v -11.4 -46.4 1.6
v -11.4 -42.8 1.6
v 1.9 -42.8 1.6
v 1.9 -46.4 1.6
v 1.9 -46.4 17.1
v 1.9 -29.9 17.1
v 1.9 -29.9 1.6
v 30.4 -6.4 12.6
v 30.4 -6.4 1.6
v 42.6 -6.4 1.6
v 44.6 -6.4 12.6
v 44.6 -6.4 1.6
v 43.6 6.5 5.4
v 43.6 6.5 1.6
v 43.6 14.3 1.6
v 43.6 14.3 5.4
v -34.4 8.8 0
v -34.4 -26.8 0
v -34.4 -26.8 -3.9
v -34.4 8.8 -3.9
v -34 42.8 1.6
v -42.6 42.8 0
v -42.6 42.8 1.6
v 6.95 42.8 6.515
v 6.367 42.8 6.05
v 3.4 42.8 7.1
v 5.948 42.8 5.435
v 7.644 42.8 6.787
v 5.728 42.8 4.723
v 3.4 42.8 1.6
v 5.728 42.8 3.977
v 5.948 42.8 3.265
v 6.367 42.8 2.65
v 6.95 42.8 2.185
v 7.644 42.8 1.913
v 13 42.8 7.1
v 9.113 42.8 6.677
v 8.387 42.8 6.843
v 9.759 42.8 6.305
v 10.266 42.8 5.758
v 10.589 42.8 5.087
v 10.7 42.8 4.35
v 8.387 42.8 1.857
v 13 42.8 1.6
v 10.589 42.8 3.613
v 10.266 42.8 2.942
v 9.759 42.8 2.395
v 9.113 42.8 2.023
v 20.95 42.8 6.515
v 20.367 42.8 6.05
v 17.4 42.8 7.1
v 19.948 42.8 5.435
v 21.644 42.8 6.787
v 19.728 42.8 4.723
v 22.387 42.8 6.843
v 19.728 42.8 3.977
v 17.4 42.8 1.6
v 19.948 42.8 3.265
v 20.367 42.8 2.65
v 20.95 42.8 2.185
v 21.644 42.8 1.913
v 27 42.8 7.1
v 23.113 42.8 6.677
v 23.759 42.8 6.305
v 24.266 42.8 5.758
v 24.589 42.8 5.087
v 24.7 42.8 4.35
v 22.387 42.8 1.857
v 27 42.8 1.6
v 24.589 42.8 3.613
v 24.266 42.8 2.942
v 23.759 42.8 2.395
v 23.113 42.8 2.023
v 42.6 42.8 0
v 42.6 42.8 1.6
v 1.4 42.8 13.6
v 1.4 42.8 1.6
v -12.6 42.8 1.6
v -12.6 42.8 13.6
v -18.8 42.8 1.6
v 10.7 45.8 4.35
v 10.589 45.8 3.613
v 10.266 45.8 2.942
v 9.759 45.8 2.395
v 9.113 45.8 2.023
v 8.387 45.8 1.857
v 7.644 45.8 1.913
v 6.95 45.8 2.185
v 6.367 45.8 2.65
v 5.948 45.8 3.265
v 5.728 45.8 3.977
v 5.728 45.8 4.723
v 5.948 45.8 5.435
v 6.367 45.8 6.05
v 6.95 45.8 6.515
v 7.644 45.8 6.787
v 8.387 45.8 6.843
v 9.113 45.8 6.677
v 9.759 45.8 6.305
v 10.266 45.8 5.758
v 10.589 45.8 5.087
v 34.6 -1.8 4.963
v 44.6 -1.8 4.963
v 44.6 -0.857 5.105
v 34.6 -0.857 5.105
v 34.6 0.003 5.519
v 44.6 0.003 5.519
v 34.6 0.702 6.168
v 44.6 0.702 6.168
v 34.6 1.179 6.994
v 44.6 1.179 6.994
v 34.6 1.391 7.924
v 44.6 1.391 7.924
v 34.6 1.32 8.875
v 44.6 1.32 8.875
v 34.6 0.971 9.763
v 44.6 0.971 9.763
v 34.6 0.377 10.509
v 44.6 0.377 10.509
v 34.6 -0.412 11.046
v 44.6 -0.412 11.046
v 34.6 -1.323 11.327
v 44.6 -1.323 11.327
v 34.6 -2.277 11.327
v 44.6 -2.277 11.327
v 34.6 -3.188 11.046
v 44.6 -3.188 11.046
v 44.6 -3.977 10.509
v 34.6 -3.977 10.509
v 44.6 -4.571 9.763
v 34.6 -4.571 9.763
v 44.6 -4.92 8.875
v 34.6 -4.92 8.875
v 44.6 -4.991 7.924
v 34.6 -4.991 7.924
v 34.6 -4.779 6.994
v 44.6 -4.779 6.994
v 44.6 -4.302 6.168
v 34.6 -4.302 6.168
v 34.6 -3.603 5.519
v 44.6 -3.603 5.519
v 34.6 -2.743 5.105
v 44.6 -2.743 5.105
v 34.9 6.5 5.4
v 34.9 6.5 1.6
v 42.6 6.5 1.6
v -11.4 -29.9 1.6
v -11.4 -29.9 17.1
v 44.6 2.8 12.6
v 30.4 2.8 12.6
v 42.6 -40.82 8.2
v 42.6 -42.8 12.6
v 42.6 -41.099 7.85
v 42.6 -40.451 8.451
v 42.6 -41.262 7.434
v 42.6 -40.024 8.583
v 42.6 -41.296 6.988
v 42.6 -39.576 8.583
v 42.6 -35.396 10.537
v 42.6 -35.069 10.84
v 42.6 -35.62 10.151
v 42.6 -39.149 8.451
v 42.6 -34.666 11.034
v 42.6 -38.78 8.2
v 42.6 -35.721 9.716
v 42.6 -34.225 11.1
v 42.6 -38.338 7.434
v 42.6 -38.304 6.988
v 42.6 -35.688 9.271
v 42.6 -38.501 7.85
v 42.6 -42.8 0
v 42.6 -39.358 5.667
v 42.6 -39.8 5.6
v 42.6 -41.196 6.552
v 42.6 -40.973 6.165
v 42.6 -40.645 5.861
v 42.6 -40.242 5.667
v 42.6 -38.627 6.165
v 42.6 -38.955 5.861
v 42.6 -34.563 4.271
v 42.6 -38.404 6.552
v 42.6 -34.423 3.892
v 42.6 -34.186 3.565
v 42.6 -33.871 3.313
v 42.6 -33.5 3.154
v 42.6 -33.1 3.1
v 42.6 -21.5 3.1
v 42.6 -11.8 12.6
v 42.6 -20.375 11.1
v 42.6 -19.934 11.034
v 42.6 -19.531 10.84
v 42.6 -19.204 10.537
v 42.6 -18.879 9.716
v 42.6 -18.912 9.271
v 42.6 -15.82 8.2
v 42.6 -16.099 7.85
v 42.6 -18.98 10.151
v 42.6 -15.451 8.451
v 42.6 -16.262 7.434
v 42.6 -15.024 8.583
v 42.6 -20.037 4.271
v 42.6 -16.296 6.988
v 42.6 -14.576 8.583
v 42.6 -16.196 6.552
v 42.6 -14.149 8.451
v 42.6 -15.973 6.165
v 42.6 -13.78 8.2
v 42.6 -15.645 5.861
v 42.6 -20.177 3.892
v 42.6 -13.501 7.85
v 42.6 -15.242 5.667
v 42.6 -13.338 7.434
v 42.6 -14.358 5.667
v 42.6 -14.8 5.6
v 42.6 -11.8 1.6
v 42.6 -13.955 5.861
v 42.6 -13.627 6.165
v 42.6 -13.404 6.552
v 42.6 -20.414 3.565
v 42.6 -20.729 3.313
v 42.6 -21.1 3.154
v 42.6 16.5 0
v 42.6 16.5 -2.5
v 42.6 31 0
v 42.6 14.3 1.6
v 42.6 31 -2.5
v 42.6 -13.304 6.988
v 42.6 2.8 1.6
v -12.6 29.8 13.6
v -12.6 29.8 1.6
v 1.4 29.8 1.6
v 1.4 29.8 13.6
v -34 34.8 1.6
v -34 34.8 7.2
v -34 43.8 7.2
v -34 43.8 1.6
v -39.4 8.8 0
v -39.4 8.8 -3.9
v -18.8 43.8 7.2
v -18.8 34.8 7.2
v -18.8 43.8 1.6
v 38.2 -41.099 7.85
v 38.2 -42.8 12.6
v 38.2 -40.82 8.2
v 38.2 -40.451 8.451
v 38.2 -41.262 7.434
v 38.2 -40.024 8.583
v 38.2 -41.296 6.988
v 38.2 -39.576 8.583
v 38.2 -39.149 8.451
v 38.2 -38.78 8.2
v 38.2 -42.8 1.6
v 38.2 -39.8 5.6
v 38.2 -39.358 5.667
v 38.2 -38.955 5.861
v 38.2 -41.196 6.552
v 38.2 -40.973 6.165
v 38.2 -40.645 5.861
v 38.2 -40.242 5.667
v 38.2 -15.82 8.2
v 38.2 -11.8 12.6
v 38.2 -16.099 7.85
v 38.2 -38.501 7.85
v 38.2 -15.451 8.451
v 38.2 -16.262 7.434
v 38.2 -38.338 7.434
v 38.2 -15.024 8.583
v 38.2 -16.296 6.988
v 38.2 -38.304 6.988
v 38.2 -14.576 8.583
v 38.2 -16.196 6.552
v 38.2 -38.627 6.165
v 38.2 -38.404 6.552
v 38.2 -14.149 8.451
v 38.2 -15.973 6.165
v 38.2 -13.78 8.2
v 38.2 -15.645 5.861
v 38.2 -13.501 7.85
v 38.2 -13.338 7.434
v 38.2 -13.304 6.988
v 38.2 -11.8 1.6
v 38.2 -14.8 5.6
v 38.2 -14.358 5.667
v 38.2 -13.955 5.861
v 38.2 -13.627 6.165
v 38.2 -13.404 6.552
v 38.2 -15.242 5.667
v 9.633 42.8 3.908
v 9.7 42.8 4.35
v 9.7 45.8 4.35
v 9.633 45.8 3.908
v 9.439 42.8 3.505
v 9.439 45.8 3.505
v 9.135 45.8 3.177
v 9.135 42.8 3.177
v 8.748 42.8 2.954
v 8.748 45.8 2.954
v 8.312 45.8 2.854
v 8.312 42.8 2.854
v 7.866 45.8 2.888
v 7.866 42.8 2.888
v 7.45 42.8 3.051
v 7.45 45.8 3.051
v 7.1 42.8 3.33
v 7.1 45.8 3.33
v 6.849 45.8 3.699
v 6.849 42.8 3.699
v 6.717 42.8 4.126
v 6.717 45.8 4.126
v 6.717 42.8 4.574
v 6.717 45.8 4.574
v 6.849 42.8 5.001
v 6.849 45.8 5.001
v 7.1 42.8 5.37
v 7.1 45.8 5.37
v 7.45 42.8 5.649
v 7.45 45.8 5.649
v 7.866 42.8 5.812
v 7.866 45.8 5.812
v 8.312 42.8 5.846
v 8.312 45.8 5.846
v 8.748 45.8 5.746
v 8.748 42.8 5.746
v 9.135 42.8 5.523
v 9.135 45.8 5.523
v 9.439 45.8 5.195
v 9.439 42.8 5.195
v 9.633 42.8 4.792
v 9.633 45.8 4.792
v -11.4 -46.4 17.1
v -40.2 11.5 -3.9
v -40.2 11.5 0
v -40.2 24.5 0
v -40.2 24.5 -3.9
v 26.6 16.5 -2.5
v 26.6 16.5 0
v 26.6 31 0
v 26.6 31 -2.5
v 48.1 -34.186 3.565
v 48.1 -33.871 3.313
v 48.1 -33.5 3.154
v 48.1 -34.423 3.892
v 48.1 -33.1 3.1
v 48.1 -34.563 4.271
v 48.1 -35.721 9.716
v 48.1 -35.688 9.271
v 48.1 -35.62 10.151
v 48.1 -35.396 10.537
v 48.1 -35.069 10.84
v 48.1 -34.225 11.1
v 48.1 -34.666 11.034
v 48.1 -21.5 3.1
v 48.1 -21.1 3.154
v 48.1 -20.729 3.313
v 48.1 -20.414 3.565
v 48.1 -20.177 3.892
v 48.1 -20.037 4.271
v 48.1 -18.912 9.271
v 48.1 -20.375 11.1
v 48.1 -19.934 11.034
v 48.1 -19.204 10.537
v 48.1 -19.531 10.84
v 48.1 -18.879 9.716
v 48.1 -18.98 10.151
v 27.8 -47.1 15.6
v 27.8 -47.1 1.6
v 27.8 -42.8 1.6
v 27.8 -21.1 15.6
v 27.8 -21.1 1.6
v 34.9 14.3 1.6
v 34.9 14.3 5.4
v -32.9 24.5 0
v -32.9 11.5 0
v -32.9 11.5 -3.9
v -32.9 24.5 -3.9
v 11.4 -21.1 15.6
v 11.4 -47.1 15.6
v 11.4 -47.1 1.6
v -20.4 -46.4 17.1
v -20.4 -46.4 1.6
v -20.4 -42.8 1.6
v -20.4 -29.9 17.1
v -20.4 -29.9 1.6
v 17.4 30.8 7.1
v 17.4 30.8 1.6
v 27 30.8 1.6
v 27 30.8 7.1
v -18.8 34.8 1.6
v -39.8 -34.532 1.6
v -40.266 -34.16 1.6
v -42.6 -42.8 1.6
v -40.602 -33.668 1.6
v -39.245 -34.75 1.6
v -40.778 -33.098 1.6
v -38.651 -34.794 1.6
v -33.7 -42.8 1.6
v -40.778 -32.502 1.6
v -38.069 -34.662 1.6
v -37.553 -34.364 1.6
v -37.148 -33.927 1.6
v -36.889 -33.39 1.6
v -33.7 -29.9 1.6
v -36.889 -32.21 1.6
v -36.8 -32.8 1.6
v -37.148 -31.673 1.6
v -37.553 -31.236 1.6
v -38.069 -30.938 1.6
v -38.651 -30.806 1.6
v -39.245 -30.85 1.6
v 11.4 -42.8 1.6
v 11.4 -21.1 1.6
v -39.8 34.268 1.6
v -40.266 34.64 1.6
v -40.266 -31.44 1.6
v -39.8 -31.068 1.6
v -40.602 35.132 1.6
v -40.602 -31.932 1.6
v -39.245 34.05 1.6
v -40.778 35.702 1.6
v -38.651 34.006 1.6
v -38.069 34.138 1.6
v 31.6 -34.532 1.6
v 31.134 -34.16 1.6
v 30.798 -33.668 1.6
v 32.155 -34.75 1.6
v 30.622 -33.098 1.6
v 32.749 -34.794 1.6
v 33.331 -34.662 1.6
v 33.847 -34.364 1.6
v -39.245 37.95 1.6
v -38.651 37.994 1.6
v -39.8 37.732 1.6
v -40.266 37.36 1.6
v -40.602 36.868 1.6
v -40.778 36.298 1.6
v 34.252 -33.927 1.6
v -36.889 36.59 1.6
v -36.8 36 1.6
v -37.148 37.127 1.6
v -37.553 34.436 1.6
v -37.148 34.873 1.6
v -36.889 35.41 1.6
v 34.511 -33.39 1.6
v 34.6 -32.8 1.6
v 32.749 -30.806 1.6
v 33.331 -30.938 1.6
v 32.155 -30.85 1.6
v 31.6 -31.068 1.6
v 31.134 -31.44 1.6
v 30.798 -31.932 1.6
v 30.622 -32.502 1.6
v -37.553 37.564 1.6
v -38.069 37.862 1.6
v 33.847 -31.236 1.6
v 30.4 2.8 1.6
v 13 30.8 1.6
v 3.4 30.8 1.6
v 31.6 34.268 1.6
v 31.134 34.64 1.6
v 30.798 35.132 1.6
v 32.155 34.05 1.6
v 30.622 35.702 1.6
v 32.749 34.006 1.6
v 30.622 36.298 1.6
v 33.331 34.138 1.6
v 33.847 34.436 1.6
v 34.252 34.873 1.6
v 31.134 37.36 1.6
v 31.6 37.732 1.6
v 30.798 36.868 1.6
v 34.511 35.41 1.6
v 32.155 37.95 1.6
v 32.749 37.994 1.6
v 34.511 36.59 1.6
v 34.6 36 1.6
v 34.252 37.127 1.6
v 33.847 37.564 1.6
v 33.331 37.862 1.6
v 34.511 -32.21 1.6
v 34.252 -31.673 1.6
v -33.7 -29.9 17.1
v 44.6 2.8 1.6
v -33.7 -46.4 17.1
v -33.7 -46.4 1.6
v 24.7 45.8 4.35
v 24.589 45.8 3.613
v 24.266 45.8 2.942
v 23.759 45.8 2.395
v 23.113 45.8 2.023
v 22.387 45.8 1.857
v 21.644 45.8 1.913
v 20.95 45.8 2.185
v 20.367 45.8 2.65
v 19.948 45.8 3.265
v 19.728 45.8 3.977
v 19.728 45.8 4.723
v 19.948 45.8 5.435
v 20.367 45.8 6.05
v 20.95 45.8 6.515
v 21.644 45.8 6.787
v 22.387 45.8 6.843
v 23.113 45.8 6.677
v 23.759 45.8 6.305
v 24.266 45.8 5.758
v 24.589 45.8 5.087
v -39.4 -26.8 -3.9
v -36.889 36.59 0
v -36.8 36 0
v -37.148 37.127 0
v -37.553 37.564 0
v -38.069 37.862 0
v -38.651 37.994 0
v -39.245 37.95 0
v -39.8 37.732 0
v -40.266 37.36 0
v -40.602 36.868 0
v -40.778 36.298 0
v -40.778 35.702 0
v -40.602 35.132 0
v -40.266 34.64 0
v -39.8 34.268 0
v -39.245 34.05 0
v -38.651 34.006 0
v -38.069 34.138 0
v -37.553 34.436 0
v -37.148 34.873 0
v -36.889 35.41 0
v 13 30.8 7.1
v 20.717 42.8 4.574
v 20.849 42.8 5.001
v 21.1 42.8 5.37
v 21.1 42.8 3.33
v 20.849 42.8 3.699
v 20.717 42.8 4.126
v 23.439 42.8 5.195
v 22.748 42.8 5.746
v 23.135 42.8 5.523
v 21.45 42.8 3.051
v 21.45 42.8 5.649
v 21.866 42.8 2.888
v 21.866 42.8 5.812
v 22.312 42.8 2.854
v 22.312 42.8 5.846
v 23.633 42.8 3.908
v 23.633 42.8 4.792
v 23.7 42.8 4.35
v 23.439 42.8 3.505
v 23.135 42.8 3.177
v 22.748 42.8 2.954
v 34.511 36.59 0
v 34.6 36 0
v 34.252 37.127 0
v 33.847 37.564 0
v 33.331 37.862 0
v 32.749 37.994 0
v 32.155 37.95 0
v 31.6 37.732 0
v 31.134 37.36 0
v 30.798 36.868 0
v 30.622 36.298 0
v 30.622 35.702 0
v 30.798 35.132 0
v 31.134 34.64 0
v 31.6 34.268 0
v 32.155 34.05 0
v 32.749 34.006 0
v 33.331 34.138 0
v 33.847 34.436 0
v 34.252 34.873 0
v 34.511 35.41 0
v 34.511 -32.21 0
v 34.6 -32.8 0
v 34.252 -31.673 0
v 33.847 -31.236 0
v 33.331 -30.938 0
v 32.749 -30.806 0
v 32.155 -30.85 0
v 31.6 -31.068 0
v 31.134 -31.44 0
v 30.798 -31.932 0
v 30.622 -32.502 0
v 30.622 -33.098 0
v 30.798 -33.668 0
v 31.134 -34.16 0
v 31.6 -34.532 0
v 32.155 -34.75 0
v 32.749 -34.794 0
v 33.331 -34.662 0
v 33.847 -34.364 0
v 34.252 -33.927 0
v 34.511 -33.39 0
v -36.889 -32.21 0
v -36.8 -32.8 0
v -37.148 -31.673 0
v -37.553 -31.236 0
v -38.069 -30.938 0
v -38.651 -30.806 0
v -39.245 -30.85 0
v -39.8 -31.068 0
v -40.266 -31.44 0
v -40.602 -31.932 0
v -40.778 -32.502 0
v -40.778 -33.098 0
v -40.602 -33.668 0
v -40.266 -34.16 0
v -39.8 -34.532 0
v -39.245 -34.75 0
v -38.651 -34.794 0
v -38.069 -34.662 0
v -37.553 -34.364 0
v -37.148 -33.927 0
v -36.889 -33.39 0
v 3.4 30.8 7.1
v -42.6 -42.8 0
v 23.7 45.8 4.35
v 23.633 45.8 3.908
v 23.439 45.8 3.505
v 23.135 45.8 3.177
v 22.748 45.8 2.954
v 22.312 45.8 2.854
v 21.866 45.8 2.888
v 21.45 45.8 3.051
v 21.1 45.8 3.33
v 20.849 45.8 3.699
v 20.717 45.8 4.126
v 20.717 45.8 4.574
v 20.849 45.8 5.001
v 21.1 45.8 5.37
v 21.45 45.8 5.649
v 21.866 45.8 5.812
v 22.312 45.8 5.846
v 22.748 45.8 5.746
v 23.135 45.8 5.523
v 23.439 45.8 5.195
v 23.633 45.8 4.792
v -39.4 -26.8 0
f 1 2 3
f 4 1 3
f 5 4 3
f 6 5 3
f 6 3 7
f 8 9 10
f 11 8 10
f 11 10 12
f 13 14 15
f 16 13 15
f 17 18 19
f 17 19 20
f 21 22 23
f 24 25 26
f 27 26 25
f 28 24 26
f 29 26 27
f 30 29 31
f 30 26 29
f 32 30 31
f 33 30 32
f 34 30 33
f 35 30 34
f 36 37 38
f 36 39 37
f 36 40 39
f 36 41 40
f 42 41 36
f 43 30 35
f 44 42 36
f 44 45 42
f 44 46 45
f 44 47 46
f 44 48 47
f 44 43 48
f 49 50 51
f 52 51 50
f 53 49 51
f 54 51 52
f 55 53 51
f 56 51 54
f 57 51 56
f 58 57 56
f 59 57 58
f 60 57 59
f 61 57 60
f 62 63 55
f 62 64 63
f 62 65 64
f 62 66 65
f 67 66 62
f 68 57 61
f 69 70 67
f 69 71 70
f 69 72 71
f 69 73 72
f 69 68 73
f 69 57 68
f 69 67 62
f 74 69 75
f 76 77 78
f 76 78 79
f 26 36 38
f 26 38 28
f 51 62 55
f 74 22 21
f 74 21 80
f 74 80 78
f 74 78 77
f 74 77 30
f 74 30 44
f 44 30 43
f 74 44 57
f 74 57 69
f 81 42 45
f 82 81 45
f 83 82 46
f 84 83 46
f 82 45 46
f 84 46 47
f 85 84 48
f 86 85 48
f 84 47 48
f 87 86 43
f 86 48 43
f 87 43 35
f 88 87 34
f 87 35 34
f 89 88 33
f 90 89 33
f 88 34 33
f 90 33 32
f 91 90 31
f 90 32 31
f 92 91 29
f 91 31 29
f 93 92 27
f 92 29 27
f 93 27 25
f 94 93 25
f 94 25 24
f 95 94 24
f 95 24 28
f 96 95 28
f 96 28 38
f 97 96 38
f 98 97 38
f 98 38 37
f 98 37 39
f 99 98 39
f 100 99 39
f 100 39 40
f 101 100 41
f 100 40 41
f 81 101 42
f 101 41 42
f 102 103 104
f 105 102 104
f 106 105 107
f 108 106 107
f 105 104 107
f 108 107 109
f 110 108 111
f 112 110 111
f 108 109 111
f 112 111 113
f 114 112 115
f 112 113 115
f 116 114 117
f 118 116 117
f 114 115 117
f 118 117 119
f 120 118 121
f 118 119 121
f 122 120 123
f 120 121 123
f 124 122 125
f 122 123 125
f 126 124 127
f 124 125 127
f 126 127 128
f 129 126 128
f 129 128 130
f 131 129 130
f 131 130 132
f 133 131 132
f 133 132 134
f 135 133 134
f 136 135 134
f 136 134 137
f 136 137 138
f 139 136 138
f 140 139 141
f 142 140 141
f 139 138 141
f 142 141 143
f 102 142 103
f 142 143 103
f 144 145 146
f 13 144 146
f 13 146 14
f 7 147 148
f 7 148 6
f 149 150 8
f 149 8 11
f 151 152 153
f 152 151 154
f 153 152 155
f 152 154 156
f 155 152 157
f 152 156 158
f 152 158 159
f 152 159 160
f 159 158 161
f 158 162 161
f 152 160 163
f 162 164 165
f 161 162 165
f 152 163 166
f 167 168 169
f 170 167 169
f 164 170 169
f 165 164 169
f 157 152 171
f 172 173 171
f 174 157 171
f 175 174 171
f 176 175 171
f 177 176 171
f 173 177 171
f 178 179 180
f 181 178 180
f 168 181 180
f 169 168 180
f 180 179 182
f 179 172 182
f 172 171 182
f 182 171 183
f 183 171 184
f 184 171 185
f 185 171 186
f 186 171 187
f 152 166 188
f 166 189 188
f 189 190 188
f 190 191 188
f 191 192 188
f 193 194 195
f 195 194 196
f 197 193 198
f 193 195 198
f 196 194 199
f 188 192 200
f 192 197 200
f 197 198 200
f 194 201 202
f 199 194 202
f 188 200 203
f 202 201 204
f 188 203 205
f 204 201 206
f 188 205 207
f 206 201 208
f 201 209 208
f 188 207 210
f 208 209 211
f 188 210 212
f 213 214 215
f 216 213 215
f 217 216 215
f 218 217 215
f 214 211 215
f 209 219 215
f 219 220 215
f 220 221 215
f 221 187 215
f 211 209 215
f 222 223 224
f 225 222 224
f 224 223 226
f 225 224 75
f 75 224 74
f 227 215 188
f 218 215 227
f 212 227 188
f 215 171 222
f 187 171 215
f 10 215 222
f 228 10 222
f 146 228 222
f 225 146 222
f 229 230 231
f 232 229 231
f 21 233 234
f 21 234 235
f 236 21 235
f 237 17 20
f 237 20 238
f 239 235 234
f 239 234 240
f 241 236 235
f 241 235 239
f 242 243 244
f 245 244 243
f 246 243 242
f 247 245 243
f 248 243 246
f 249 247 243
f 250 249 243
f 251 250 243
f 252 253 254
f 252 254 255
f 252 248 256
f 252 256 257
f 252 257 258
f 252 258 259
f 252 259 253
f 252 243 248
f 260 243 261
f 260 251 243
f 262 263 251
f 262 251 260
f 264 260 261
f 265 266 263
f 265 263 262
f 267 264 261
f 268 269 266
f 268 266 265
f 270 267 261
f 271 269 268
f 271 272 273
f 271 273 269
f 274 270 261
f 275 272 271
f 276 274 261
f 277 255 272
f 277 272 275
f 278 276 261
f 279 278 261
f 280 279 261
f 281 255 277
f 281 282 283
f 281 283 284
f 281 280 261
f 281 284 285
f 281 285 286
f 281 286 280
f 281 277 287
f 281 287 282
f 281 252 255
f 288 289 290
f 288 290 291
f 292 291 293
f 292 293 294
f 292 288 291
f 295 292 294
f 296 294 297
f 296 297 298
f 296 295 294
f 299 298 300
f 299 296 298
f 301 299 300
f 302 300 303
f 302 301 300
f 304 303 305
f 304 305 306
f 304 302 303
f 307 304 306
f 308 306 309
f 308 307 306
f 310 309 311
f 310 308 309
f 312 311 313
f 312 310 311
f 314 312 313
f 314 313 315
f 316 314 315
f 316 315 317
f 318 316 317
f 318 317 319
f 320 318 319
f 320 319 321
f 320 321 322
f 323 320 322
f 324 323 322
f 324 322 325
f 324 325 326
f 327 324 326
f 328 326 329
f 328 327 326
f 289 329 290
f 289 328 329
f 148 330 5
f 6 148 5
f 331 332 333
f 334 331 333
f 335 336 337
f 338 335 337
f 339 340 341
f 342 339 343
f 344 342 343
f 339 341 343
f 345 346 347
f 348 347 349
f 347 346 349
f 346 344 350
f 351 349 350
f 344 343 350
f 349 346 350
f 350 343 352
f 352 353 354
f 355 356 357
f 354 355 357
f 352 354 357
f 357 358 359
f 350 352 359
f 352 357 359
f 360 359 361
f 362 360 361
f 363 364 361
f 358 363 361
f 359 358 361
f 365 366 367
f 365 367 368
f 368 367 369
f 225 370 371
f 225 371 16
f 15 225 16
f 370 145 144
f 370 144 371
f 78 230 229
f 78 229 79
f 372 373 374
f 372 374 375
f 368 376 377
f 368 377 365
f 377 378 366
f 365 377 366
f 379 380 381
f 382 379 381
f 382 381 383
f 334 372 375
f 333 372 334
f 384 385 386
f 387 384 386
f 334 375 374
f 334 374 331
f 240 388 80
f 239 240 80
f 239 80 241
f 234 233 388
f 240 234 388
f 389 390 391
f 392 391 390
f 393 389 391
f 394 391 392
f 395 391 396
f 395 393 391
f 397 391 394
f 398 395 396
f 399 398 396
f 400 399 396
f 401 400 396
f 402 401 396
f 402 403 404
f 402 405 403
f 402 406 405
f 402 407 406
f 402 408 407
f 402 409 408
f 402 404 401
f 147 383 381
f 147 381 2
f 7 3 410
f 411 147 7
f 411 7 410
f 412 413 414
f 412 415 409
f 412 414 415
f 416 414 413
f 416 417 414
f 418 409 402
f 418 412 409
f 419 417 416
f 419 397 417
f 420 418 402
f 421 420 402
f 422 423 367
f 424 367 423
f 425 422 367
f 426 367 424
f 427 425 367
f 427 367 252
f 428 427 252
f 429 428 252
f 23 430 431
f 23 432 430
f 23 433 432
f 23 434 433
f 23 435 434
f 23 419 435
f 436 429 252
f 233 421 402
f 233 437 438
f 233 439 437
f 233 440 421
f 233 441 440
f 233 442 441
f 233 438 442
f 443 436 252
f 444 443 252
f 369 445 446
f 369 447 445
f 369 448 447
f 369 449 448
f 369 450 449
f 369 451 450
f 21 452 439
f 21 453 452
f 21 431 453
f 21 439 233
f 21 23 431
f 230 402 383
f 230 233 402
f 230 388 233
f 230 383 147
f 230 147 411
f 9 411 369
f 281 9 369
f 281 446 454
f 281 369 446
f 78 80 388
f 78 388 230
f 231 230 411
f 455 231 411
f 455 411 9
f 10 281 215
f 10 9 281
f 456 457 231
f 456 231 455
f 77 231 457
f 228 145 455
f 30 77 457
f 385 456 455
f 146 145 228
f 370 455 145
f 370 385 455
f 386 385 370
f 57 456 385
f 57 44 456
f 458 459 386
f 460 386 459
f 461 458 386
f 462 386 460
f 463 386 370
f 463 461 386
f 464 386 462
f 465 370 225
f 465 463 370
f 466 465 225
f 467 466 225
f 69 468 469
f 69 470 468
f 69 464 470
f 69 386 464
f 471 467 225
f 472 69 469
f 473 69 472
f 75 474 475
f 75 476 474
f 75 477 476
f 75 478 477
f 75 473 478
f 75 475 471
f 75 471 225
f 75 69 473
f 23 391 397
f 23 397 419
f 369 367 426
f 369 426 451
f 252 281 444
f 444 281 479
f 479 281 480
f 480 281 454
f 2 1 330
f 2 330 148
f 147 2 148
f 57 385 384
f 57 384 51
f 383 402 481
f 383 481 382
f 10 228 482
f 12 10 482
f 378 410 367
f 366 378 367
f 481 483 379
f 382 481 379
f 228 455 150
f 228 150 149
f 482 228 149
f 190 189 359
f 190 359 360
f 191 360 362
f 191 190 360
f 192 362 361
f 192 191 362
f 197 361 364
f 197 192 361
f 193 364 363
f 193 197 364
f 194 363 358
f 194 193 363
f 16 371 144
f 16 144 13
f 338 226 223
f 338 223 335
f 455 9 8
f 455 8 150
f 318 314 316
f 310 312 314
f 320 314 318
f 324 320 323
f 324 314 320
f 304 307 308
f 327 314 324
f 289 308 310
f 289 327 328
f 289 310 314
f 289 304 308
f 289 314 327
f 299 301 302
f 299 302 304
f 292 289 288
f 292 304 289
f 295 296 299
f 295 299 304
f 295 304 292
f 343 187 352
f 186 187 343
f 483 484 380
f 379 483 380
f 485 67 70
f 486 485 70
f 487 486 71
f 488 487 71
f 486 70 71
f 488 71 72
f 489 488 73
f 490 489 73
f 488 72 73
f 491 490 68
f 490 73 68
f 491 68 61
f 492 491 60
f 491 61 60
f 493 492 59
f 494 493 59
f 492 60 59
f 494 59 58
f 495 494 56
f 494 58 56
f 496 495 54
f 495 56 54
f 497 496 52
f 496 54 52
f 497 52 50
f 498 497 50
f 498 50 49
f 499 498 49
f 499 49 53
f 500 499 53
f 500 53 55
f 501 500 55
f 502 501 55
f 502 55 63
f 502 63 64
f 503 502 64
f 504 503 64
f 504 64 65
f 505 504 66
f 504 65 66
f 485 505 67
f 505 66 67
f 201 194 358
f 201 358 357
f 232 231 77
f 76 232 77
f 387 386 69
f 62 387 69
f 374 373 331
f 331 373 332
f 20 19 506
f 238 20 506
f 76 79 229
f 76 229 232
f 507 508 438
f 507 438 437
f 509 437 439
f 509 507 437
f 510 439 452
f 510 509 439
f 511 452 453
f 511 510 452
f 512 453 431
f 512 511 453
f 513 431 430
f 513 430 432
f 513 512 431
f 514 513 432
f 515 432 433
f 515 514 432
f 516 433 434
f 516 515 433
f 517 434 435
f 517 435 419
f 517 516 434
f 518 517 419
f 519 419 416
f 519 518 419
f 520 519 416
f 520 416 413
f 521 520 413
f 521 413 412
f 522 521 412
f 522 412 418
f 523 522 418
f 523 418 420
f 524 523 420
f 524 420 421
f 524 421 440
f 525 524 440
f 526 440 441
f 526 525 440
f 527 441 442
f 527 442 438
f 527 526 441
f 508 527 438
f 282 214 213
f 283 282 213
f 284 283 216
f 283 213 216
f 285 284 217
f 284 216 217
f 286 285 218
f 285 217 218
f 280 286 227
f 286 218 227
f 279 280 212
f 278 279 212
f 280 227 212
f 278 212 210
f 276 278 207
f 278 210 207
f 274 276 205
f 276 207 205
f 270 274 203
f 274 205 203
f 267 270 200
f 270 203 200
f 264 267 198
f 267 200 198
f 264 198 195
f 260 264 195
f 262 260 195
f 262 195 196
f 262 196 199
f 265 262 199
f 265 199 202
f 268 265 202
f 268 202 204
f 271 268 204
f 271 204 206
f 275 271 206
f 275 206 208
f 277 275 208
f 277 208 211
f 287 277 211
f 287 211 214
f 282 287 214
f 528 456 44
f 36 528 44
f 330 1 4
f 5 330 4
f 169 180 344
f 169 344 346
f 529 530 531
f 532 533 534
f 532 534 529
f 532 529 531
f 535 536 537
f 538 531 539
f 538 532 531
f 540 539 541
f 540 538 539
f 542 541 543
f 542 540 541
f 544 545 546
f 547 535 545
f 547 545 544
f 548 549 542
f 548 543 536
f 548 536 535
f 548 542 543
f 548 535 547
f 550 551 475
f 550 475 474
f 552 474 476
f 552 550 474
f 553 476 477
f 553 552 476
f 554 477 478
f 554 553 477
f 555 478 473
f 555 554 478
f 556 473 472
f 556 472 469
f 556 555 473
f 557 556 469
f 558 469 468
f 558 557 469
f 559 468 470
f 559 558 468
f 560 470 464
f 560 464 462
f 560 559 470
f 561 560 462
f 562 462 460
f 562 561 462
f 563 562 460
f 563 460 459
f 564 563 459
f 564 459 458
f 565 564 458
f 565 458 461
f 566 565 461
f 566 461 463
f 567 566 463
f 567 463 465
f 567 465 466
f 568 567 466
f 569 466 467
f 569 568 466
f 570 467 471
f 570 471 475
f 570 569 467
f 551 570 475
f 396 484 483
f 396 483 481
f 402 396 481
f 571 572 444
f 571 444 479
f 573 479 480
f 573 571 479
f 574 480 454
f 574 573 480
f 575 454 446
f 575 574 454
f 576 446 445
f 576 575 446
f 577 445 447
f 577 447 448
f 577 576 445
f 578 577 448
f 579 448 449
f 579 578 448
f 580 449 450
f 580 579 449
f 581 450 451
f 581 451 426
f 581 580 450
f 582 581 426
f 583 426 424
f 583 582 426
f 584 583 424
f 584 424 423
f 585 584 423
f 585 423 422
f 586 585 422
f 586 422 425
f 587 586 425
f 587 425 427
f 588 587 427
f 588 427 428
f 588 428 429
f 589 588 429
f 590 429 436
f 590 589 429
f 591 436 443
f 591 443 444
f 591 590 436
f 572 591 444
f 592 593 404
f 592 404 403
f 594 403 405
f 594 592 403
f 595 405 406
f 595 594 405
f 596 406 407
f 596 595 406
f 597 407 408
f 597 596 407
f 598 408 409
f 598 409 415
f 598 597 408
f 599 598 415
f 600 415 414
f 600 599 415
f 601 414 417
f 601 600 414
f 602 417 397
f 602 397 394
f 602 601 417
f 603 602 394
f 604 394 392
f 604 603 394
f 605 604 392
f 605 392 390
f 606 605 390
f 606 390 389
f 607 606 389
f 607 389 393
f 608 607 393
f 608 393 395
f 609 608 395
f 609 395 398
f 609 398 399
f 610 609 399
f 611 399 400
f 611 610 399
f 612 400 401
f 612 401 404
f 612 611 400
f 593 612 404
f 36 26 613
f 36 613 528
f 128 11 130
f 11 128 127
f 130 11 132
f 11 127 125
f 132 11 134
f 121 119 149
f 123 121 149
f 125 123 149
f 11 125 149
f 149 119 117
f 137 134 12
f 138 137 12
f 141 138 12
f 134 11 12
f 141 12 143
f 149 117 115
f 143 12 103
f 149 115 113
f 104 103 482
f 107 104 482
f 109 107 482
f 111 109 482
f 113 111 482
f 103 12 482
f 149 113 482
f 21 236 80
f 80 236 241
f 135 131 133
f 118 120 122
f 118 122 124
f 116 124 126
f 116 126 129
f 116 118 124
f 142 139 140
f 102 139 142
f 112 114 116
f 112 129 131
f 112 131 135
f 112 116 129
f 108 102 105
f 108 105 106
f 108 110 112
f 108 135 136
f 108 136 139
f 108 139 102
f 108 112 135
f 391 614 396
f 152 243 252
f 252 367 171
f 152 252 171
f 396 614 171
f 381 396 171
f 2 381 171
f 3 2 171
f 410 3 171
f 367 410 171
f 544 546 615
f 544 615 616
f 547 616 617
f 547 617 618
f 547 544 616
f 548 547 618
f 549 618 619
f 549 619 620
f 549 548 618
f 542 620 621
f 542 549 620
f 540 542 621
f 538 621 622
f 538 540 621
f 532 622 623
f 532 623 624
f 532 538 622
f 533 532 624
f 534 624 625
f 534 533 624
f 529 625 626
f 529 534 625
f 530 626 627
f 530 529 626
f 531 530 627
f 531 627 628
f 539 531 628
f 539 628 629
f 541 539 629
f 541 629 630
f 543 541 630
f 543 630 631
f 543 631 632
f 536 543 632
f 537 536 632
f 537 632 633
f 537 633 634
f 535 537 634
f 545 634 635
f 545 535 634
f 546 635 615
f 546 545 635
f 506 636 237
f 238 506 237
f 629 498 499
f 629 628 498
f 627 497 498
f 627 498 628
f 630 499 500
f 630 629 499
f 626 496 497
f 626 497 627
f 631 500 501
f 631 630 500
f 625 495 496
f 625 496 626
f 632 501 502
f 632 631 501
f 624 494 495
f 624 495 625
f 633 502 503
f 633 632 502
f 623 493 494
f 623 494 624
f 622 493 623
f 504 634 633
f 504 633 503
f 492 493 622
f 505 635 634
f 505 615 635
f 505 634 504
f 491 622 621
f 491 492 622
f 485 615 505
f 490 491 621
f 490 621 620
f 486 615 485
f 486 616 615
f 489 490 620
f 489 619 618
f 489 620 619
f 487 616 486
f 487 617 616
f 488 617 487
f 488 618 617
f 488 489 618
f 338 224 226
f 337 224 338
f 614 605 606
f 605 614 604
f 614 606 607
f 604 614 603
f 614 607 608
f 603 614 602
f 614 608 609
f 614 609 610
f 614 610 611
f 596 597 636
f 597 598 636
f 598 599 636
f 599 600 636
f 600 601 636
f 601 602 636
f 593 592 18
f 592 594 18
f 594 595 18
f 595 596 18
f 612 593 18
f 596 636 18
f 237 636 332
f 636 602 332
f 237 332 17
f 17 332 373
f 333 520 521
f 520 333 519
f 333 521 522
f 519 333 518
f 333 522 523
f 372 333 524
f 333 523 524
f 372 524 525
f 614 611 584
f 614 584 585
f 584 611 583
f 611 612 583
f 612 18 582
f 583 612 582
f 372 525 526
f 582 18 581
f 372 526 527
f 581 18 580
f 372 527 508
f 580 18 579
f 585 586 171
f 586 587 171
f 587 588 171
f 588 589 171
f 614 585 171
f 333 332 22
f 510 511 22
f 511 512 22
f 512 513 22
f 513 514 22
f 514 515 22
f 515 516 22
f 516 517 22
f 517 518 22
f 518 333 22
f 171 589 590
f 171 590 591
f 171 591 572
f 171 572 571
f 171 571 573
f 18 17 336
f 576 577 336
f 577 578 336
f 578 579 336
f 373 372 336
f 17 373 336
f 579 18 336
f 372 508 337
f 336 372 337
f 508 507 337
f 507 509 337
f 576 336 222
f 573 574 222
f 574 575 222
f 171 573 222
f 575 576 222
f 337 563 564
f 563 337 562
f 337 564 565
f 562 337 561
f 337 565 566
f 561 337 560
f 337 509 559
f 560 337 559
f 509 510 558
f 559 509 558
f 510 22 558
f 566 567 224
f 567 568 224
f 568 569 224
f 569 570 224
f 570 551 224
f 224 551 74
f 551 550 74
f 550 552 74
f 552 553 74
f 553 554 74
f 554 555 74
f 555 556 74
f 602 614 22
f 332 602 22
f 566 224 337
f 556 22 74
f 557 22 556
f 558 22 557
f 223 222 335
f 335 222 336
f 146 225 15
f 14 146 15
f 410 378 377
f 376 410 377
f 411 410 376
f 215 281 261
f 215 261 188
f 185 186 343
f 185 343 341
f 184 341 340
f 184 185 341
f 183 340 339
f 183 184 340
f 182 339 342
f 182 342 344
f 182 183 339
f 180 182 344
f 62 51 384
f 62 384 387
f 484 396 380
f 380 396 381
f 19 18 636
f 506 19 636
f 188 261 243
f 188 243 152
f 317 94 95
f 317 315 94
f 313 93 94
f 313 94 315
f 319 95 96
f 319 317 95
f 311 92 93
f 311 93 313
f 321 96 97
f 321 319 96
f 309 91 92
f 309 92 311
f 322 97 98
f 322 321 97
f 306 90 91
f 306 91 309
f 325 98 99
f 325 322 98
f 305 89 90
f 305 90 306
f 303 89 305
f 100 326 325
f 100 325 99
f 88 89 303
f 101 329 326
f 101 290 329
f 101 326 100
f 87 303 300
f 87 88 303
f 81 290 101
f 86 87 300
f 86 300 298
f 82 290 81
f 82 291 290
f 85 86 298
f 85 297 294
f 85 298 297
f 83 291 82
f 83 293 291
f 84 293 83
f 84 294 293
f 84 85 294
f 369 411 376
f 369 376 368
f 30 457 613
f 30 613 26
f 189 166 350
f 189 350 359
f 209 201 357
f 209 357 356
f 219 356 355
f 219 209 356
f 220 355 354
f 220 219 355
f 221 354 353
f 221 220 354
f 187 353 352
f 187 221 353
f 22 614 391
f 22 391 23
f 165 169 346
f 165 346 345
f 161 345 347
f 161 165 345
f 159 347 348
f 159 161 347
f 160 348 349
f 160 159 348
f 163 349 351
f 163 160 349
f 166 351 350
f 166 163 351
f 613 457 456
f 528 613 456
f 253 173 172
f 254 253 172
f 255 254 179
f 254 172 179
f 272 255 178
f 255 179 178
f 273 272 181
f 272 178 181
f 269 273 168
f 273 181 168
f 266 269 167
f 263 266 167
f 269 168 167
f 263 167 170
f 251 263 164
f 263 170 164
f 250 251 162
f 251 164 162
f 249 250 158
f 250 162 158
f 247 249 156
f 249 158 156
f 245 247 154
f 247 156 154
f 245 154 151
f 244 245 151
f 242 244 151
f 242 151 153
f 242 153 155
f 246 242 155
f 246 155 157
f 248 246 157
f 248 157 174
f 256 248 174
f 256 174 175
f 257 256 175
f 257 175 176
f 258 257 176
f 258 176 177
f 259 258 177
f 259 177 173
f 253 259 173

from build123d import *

# Parameters (mm, degrees)
SCHIZZO1_W                    = 85.2
SCHIZZO1_H                    = 85.6
SCHIZZO1_R                    = 2
ESTRUSIONE_ESTRUSIONE1_DEPTH  = 1.6
SCHIZZO3_W                    = 15.2
SCHIZZO3_H                    = 9
ESTRUSIONE_ESTRUSIONE2_DEPTH  = 5.6
SCHIZZO4_W                    = 14
SCHIZZO4_H                    = 13
ESTRUSIONE_ESTRUSIONE3_DEPTH  = 12
SCHIZZO5_W                    = 9.6
SCHIZZO5_H                    = 12
ESTRUSIONE_ESTRUSIONE4_DEPTH  = 5.5
SCHIZZO6_R                    = 2.5
SCHIZZO6_R_2                  = 1.5
ESTRUSIONE_SOTTILE1_DEPTH     = 3
SCHIZZO7_W                    = 16
SCHIZZO7_H                    = 14.5
ESTRUSIONE_ESTRUSIONE5_DEPTH  = 2.5
SCHIZZO8_W                    = 8.7
SCHIZZO8_H                    = 7.8
ESTRUSIONE_ESTRUSIONE6_DEPTH  = 3.8
SCHIZZO9_W                    = 14.2
SCHIZZO9_H                    = 9.2
ESTRUSIONE_ESTRUSIONE7_DEPTH  = 11
SCHIZZO10_R                   = 3.2
TAGLIO_ESTRUSIONE1_DEPTH      = 10
SCHIZZO11_W                   = 4.4
SCHIZZO11_H                   = 31
ESTRUSIONE_ESTRUSIONE8_DEPTH  = 11
ESTRUSIONE_ESTRUSIONE9_DEPTH  = 5.5
SCHIZZO14_R                   = 1.5
TAGLIO_ESTRUSIONE2_DEPTH      = 5.5
SCHIZZO15_W                   = 16.4
SCHIZZO15_H                   = 26
ESTRUSIONE_ESTRUSIONE10_DEPTH = 14
SCHIZZO16_W                   = 13.3
SCHIZZO16_H                   = 16.5
ESTRUSIONE_ESTRUSIONE11_DEPTH = 15.5
SCHIZZO17_W                   = 7.3
SCHIZZO17_H                   = 13
SCHIZZO17_W_2                 = 5
SCHIZZO17_H_2                 = 35.6
ESTRUSIONE_ESTRUSIONE12_DEPTH = 3.9


with BuildPart() as part:
    # Schizzo1 → Estrusione-Estrusione1 (new body)
    with BuildSketch(Plane.XY):
        Rectangle(SCHIZZO1_W, SCHIZZO1_H)
        with Locations((-38.8, 36)):
            Circle(SCHIZZO1_R, mode=Mode.SUBTRACT)
        with Locations((32.6, 36)):
            Circle(SCHIZZO1_R, mode=Mode.SUBTRACT)
        with Locations((-38.8, -32.8)):
            Circle(SCHIZZO1_R, mode=Mode.SUBTRACT)
        with Locations((32.6, -32.8)):
            Circle(SCHIZZO1_R, mode=Mode.SUBTRACT)
    extrude(amount=ESTRUSIONE_ESTRUSIONE1_DEPTH)

    # Schizzo3 → Estrusione-Estrusione2 (add)
    with BuildSketch(Plane.XY.offset(1.6)):
        with Locations((-26.4, 39.3)):
            Rectangle(SCHIZZO3_W, SCHIZZO3_H)
    extrude(amount=ESTRUSIONE_ESTRUSIONE2_DEPTH)

    # Schizzo4 → Estrusione-Estrusione3 (add)
    with BuildSketch(Plane.XY.offset(1.6)):
        with Locations((-5.6, 36.3)):
            Rectangle(SCHIZZO4_W, SCHIZZO4_H)
    extrude(amount=ESTRUSIONE_ESTRUSIONE3_DEPTH)

    # Schizzo5 → Estrusione-Estrusione4 (add)
    with BuildSketch(Plane.XY.offset(1.6)):
        with Locations((8.2, 36.8)):
            Rectangle(SCHIZZO5_W, SCHIZZO5_H)
        with Locations((22.2, 36.8)):
            Rectangle(SCHIZZO5_W, SCHIZZO5_H)
    extrude(amount=ESTRUSIONE_ESTRUSIONE4_DEPTH)

    # Schizzo6 → Estrusione-Sottile1 (add)
    # profile 1 of 2: a face of its own
    with BuildSketch(Plane(origin=(0, 42.8, 0), x_dir=(1, 0, 0), z_dir=(0, 1, 0))):
        with Locations((8.2, -4.35)):
            Circle(SCHIZZO6_R)
        with Locations((8.2, -4.35)):
            Circle(SCHIZZO6_R_2, mode=Mode.SUBTRACT)
    # profile 2 of 2: a face of its own
    with BuildSketch(Plane(origin=(0, 42.8, 0), x_dir=(1, 0, 0), z_dir=(0, 1, 0))):
        with Locations((22.2, -4.35)):
            Circle(SCHIZZO6_R)
        with Locations((22.2, -4.35)):
            Circle(SCHIZZO6_R_2, mode=Mode.SUBTRACT)
    extrude(amount=ESTRUSIONE_SOTTILE1_DEPTH)

    # Schizzo7 → Estrusione-Estrusione5 (add)
    with BuildSketch(Plane(origin=(0, 0, 0), x_dir=(-1, 0, 0), z_dir=(0, 0, -1))):
        with Locations((-34.6, 23.75)):
            Rectangle(SCHIZZO7_W, SCHIZZO7_H)
    extrude(amount=ESTRUSIONE_ESTRUSIONE5_DEPTH)

    # Schizzo8 → Estrusione-Estrusione6 (add)
    with BuildSketch(Plane.XY.offset(1.6)):
        with Locations((39.25, 10.4)):
            Rectangle(SCHIZZO8_W, SCHIZZO8_H)
    extrude(amount=ESTRUSIONE_ESTRUSIONE6_DEPTH)

    # Schizzo9 → Estrusione-Estrusione7 (add)
    with BuildSketch(Plane.XY.offset(1.6)):
        with Locations((37.5, -1.8)):
            Rectangle(SCHIZZO9_W, SCHIZZO9_H)
    extrude(amount=ESTRUSIONE_ESTRUSIONE7_DEPTH)

    # Schizzo10 → Taglio-Estrusione1 (cut)
    with BuildSketch(Plane(origin=(44.6, 0, 0), x_dir=(0, 0, -1), z_dir=(1, 0, 0))):
        with Locations((-8.163212145, -1.8)):
            Circle(SCHIZZO10_R)
    extrude(amount=-TAGLIO_ESTRUSIONE1_DEPTH, mode=Mode.SUBTRACT)

    # Schizzo11 → Estrusione-Estrusione8 (add)
    with BuildSketch(Plane.XY.offset(1.6)):
        with Locations((40.4, -27.3)):
            Rectangle(SCHIZZO11_W, SCHIZZO11_H)
    extrude(amount=ESTRUSIONE_ESTRUSIONE8_DEPTH)

    # Schizzo12 → Estrusione-Estrusione9 (add)
    with BuildSketch(Plane(origin=(42.6, 0, 0), x_dir=(0, 0, -1), z_dir=(1, 0, 0))):
        with BuildLine():
            Line((-11.1, -34.225), (-11.1, -20.375))
            ThreePointArc((-11.1, -20.375), (-10.537042571, -19.203696786), (-9.270731707, -18.911585366))
            Line((-9.270731707, -18.911585366), (-4.270731707, -20.036585366))
            ThreePointArc((-4.270731707, -20.036585366), (-3.428696786, -20.562957429), (-3.1, -21.5))
            Line((-3.1, -21.5), (-3.1, -33.1))
            ThreePointArc((-3.1, -33.1), (-3.428696786, -34.037042571), (-4.270731707, -34.563414634))
            Line((-4.270731707, -34.563414634), (-9.270731707, -35.688414634))
            ThreePointArc((-9.270731707, -35.688414634), (-10.537042571, -35.396303214), (-11.1, -34.225))
        make_face()
    extrude(amount=ESTRUSIONE_ESTRUSIONE9_DEPTH)

    # Schizzo14 → Taglio-Estrusione2 (cut)
    with BuildSketch(Plane(origin=(42.6, 0, 0), x_dir=(0, 0, -1), z_dir=(1, 0, 0))):
        with Locations((-7.1, -14.8)):
            Circle(SCHIZZO14_R)
        with Locations((-7.1, -39.8)):
            Circle(SCHIZZO14_R)
    extrude(amount=-TAGLIO_ESTRUSIONE2_DEPTH, mode=Mode.SUBTRACT)

    # Schizzo15 → Estrusione-Estrusione10 (add)
    with BuildSketch(Plane.XY.offset(1.6)):
        with Locations((19.6, -34.1)):
            Rectangle(SCHIZZO15_W, SCHIZZO15_H)
    extrude(amount=ESTRUSIONE_ESTRUSIONE10_DEPTH)

    # Schizzo16 → Estrusione-Estrusione11 (add)
    with BuildSketch(Plane.XY.offset(1.6)):
        with Locations((-27.05, -38.15)):
            Rectangle(SCHIZZO16_W, SCHIZZO16_H)
        with Locations((-4.75, -38.15)):
            Rectangle(SCHIZZO16_W, SCHIZZO16_H)
    extrude(amount=ESTRUSIONE_ESTRUSIONE11_DEPTH)

    # Schizzo17 → Estrusione-Estrusione12 (add)
    with BuildSketch(Plane(origin=(0, 0, 0), x_dir=(-1, 0, 0), z_dir=(0, 0, -1))):
        with Locations((36.55, 18)):
            Rectangle(SCHIZZO17_W, SCHIZZO17_H)
        with Locations((36.9, -9)):
            Rectangle(SCHIZZO17_W_2, SCHIZZO17_H_2)
    extrude(amount=ESTRUSIONE_ESTRUSIONE12_DEPTH)


solid = part.part
